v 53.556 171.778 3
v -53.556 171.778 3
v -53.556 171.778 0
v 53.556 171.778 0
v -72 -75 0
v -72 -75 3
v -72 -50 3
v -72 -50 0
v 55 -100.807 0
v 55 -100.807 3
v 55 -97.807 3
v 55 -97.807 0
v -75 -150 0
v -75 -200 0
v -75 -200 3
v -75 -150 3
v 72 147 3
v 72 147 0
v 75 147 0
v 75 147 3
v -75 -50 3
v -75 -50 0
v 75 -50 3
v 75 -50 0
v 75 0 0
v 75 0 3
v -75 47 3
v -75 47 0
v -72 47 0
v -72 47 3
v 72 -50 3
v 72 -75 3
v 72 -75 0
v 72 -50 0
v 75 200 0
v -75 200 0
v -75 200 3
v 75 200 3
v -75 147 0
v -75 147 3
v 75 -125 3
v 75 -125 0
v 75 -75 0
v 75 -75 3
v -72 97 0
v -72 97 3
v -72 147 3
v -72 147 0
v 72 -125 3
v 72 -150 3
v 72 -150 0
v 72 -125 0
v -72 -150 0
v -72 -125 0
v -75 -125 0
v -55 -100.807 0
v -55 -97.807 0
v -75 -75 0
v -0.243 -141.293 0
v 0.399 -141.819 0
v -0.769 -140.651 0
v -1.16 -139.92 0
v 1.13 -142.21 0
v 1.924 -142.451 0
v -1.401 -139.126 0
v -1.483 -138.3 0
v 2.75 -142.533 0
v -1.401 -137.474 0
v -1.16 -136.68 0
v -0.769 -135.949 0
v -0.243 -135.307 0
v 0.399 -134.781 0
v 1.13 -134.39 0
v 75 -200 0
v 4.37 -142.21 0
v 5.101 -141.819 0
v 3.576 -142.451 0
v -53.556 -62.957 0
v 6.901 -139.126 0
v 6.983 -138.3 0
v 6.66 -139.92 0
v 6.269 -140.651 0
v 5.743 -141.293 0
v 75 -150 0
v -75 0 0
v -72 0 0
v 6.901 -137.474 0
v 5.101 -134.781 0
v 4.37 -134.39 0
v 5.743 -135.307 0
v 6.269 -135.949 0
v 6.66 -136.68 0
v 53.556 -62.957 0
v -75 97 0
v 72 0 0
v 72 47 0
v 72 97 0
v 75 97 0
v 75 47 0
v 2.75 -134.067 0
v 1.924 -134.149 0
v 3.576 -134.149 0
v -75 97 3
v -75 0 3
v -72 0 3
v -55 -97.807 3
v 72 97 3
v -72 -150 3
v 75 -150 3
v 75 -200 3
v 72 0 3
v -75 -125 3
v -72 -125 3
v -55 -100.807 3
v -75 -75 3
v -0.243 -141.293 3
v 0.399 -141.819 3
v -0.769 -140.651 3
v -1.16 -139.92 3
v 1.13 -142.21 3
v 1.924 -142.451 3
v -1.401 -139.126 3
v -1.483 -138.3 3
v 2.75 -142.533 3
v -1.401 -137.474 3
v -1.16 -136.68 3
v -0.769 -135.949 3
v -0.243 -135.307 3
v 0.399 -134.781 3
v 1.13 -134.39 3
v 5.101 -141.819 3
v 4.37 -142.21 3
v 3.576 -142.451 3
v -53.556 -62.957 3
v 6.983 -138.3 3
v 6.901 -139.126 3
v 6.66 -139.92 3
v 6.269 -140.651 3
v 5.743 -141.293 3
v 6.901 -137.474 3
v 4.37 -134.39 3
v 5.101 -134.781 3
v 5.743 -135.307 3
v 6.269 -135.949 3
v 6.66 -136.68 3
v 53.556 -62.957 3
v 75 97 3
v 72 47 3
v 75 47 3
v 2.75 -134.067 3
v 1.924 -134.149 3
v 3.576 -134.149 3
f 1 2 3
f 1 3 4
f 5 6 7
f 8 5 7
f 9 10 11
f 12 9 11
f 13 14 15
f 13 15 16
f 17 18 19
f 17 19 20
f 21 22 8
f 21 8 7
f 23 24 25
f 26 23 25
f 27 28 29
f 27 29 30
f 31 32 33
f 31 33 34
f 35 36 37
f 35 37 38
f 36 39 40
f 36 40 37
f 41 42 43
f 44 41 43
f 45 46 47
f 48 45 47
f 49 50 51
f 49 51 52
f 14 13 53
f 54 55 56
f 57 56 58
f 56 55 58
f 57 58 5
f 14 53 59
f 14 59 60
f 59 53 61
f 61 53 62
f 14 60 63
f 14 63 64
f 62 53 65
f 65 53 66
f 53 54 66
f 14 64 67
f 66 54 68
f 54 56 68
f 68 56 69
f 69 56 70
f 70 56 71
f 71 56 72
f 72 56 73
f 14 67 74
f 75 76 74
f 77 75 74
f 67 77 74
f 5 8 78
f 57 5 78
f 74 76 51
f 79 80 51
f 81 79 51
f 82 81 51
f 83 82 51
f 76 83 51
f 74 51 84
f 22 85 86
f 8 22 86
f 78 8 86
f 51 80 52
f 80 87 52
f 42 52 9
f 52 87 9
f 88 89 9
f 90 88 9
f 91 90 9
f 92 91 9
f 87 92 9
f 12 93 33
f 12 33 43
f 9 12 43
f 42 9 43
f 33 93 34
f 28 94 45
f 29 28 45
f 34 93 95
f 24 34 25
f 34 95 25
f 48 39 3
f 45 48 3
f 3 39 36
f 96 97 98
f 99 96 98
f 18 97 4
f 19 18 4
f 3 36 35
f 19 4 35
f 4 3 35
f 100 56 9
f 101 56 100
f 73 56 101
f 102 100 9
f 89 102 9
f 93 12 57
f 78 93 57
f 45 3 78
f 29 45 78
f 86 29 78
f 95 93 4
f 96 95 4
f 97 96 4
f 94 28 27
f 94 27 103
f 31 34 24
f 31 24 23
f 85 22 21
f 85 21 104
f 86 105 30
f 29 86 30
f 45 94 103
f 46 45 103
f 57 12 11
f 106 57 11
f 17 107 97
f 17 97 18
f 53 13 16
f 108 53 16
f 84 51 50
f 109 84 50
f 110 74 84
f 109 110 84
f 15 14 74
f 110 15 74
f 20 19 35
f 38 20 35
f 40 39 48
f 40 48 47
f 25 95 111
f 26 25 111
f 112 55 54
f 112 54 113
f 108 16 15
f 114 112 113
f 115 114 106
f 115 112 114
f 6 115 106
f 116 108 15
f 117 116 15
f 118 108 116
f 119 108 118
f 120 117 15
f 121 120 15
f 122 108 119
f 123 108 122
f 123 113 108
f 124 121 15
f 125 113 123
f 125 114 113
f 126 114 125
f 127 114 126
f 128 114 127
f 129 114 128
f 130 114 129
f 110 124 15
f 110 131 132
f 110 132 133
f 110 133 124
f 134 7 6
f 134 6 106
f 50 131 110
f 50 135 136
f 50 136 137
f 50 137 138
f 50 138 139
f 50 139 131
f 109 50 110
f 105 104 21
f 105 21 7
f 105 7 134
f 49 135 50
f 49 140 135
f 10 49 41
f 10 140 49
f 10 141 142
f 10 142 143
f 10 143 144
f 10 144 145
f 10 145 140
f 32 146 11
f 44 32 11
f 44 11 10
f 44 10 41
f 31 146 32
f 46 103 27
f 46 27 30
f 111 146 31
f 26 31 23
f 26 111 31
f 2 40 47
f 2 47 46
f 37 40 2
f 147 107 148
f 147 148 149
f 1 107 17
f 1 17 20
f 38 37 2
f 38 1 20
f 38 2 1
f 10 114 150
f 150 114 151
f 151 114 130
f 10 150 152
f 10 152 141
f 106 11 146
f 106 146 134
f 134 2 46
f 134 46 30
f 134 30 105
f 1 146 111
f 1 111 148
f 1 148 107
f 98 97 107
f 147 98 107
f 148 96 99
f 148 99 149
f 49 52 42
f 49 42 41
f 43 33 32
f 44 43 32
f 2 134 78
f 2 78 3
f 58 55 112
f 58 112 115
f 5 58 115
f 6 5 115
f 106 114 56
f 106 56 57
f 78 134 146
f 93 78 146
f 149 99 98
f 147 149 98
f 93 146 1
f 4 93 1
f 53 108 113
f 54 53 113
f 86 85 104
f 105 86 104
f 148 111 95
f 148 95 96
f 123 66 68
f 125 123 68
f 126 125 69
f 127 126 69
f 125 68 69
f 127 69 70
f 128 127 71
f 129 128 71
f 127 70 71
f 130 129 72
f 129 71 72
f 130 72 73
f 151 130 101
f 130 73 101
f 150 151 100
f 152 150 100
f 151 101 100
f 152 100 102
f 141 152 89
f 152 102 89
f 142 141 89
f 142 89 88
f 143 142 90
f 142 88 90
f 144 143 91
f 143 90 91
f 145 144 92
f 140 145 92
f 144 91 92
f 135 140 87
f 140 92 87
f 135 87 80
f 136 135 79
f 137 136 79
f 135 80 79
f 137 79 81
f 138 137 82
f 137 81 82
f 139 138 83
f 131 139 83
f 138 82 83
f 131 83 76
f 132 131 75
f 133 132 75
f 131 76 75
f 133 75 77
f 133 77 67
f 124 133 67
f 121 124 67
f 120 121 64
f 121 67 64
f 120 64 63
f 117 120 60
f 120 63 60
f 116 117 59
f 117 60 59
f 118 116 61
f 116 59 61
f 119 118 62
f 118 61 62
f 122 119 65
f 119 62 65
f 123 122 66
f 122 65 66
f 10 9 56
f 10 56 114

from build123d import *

# Parameters (mm, degrees)
SKETCH1_W             = 150
SKETCH1_H             = 400
BOSS_EXTRUDE1_DEPTH   = 3
SKETCH6_R             = 4.232555097
CUT_EXTRUDE5_DEPTH    = 3
CAVITY1_START         = -75
CAVITY1_OUTLINE_W     = 50
CAVITY1_OUTLINE_H     = 3
CAVITY1_OUTLINE_W_2   = 47
CAVITY1_OUTLINE_W_3   = 25
CAVITY1_DEPTH         = 3
CAVITY1_START_2       = 72
CAVITY1_2_OUTLINE_W   = 50
CAVITY1_2_OUTLINE_H   = 3
CAVITY1_2_OUTLINE_W_2 = 47
CAVITY1_2_OUTLINE_W_3 = 25
CAVITY1_2_DEPTH       = 3
CAVITY1_START_3       = -55
CAVITY1_3_OUTLINE_W   = 3
CAVITY1_3_OUTLINE_H   = 3
CAVITY1_3_DEPTH       = 110
SKETCH7_W             = 107.112189612
SKETCH7_H             = 234.735224044
CUT_EXTRUDE6_DEPTH    = 10


# Read off the part's stored shape, not the designer's step: Cavity1
with BuildPart() as part:
    # Sketch1 → Boss-Extrude1 (new body)
    with BuildSketch(Plane.XY):
        Rectangle(SKETCH1_W, SKETCH1_H)
    extrude(amount=BOSS_EXTRUDE1_DEPTH)

    # Sketch6 → Cut-Extrude5 (cut)
    with BuildSketch(Plane(origin=(0, 0, 0), x_dir=(-1, 0, 0), z_dir=(0, 0, -1))):
        with Locations((-2.75, -138.3)):
            Circle(SKETCH6_R)
    extrude(amount=-CUT_EXTRUDE5_DEPTH, mode=Mode.SUBTRACT)

    # Cavity1 outline → Cavity1 (cut)
    with BuildSketch(Plane.YZ.offset(CAVITY1_START)):
        with Locations((122, 1.5)):
            Rectangle(CAVITY1_OUTLINE_W, CAVITY1_OUTLINE_H)
        with Locations((23.5, 1.5)):
            Rectangle(CAVITY1_OUTLINE_W_2, CAVITY1_OUTLINE_H)
        with Locations((-62.5, 1.5)):
            Rectangle(CAVITY1_OUTLINE_W_3, CAVITY1_OUTLINE_H)
        with Locations((-137.5, 1.5)):
            Rectangle(CAVITY1_OUTLINE_W_3, CAVITY1_OUTLINE_H)
    extrude(amount=CAVITY1_DEPTH, mode=Mode.SUBTRACT)

    # Cavity1 2 outline → Cavity1 2 (cut)
    with BuildSketch(Plane.YZ.offset(CAVITY1_START_2)):
        with Locations((122, 1.5)):
            Rectangle(CAVITY1_2_OUTLINE_W, CAVITY1_2_OUTLINE_H)
        with Locations((23.5, 1.5)):
            Rectangle(CAVITY1_2_OUTLINE_W_2, CAVITY1_2_OUTLINE_H)
        with Locations((-62.5, 1.5)):
            Rectangle(CAVITY1_2_OUTLINE_W_3, CAVITY1_2_OUTLINE_H)
        with Locations((-137.5, 1.5)):
            Rectangle(CAVITY1_2_OUTLINE_W_3, CAVITY1_2_OUTLINE_H)
    extrude(amount=CAVITY1_2_DEPTH, mode=Mode.SUBTRACT)

    # Cavity1 3 outline → Cavity1 3 (cut)
    with BuildSketch(Plane.YZ.offset(CAVITY1_START_3)):
        with Locations((-99.307385879, 1.5)):
            Rectangle(CAVITY1_3_OUTLINE_W, CAVITY1_3_OUTLINE_H)
    extrude(amount=CAVITY1_3_DEPTH, mode=Mode.SUBTRACT)

    # Sketch7 → Cut-Extrude6 (cut)
    with BuildSketch(Plane.XY.offset(3)):
        with Locations((0, 54.41071334)):
            Rectangle(SKETCH7_W, SKETCH7_H)
    extrude(amount=-CUT_EXTRUDE6_DEPTH, mode=Mode.SUBTRACT)


solid = part.part
